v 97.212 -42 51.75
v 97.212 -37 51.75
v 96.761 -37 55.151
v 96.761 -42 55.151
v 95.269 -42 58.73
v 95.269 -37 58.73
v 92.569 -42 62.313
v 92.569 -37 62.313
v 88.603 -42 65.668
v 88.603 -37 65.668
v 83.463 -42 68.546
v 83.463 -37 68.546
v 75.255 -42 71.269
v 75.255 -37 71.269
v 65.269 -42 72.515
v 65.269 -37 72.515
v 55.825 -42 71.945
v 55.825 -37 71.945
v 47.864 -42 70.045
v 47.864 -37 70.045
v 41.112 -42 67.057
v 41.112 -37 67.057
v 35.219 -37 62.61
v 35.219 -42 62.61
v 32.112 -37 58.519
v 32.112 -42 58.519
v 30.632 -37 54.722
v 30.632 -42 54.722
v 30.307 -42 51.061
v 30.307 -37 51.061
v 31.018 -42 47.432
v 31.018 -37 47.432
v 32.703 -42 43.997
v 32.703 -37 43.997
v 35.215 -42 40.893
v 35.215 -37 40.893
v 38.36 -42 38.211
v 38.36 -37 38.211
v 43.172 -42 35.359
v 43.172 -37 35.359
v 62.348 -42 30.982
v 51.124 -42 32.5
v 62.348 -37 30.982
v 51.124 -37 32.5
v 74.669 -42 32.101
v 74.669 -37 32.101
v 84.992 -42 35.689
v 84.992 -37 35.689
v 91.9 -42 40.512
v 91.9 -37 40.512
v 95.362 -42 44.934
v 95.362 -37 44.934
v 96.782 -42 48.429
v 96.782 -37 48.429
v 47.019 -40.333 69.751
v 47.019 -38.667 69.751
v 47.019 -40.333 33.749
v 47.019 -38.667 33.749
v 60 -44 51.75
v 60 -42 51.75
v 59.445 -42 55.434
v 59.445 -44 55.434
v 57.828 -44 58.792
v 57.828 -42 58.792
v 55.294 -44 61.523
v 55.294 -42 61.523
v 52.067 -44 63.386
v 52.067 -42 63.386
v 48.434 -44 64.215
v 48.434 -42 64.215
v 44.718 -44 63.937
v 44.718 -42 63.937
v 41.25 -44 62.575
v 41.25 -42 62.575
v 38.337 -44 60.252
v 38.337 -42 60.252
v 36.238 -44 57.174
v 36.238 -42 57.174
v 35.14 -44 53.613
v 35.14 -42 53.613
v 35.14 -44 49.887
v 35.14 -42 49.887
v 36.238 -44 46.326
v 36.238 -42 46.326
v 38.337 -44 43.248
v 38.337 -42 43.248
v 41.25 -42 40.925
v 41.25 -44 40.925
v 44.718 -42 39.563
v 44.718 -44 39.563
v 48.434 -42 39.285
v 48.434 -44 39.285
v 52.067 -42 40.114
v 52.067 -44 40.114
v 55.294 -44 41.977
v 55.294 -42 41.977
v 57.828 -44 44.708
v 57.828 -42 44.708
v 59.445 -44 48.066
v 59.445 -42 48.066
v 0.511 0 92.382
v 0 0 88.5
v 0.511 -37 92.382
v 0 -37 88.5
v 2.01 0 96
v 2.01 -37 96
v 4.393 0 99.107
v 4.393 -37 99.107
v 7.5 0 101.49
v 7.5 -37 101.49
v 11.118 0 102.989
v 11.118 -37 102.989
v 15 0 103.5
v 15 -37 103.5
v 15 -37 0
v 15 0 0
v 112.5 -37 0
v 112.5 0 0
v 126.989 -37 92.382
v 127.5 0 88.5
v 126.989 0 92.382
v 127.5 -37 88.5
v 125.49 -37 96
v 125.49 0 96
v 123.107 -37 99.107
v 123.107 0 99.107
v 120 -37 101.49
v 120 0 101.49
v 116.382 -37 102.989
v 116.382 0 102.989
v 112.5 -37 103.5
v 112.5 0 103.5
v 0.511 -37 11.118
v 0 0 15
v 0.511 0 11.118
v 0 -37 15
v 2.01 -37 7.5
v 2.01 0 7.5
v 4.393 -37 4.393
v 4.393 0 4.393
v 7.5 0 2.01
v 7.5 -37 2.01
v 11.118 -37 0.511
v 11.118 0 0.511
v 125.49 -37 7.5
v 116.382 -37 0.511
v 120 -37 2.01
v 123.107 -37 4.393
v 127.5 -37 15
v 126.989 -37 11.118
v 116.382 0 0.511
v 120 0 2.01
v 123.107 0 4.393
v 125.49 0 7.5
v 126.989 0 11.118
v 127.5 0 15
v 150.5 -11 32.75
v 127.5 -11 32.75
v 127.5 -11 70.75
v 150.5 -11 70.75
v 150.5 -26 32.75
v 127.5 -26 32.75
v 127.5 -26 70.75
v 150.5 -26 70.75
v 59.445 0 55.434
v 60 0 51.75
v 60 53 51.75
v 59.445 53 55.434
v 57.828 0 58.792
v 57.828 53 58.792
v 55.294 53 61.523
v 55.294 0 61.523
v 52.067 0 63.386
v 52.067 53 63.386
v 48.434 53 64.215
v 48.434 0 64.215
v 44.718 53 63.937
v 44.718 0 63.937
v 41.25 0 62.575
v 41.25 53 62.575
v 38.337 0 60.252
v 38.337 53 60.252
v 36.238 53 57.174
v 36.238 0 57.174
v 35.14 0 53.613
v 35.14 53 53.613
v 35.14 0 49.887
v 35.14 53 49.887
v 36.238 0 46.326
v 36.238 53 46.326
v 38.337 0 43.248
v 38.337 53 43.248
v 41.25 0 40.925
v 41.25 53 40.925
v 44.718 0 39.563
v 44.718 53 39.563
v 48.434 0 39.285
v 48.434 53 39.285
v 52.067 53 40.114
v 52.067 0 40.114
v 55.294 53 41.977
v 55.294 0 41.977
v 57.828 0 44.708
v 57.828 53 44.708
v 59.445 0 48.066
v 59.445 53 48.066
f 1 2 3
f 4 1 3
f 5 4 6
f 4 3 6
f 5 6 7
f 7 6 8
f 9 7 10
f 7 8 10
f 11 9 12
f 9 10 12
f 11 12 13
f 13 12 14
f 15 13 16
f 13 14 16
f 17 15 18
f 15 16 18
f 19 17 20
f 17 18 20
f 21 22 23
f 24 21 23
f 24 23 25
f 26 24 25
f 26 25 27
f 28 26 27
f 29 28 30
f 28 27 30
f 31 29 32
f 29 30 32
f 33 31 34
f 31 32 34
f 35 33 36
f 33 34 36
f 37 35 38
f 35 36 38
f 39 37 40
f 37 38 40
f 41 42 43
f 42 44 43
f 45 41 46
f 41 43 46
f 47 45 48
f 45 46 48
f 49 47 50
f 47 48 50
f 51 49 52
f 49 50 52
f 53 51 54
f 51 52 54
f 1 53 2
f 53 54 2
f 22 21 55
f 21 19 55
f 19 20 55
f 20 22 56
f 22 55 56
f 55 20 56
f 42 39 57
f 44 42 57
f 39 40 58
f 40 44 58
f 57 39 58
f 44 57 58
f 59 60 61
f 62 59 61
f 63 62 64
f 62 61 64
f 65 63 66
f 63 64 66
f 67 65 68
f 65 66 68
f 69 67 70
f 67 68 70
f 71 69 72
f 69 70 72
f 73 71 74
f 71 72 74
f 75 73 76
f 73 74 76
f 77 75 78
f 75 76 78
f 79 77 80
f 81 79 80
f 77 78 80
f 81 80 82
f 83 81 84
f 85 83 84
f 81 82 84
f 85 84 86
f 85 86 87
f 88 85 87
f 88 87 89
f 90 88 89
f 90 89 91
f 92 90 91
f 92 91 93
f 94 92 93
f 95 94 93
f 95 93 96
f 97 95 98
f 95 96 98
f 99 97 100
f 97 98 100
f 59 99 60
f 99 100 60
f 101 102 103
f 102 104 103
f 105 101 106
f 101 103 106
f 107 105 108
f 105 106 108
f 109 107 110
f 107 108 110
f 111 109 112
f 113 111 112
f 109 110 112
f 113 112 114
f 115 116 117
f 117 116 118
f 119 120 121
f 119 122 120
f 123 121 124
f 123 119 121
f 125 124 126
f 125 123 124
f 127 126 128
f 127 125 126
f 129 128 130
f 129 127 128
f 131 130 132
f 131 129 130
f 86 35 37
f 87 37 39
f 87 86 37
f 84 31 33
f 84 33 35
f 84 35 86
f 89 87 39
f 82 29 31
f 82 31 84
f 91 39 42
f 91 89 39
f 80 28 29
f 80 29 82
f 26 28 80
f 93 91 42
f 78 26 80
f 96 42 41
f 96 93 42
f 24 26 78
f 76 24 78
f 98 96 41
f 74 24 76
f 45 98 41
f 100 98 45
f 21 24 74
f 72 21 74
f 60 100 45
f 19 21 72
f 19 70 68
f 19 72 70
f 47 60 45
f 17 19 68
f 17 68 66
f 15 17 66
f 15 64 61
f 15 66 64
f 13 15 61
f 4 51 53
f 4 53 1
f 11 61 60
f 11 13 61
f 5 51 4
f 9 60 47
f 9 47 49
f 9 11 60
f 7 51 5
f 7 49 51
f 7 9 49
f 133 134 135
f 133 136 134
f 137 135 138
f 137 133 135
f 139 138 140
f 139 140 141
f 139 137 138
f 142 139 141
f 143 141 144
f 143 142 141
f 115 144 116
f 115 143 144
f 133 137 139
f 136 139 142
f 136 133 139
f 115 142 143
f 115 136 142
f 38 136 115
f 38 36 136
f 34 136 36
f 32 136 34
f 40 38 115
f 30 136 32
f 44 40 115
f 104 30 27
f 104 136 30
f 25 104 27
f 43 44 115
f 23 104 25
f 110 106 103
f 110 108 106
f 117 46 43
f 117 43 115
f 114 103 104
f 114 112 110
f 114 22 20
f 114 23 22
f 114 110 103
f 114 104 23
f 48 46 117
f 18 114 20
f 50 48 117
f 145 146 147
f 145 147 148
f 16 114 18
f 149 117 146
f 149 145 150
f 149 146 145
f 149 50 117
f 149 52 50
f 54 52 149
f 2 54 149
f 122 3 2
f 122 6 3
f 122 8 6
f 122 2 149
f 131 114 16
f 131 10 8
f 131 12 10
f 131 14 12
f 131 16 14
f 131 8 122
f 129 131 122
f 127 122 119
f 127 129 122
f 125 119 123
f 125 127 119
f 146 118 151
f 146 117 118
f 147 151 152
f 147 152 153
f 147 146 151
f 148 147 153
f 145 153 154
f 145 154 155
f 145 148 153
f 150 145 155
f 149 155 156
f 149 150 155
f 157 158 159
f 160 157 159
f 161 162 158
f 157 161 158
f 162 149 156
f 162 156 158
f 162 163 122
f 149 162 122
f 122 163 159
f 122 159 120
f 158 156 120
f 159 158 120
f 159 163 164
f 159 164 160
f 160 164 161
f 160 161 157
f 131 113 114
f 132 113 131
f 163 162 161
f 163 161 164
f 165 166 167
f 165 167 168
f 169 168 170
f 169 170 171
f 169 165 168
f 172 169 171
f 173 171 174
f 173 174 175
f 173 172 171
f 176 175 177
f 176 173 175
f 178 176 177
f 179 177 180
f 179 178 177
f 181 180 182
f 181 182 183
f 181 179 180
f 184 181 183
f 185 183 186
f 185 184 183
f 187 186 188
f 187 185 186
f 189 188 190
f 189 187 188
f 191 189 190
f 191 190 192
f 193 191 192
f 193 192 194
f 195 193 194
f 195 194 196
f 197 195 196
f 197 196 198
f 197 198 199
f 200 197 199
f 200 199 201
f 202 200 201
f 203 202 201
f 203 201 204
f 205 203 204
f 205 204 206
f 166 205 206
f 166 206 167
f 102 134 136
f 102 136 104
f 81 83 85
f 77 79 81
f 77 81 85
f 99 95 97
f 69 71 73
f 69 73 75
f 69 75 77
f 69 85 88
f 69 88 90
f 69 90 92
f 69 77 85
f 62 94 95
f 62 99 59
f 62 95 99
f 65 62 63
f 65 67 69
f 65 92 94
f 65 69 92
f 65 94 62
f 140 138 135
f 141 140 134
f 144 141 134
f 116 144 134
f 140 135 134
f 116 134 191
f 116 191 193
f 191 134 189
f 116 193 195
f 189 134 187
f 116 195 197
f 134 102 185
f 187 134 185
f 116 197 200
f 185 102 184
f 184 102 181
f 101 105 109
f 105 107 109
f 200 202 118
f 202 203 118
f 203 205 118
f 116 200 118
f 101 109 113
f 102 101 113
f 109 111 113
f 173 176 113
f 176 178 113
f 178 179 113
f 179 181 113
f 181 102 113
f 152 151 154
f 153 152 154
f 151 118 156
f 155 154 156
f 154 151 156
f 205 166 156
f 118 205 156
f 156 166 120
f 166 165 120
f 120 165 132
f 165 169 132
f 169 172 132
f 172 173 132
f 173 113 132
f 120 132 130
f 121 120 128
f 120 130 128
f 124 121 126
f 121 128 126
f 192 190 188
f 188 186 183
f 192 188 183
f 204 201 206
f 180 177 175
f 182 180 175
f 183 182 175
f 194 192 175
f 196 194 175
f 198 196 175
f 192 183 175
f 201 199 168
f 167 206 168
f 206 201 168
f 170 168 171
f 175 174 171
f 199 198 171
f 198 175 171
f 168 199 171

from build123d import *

# Parameters (mm, degrees)
F0_W     = 127.5
F0_H     = 103.5
F1_DEPTH = 37
F2_R     = 15
F3_W     = 15
F3_H     = 38
F4_DEPTH = 23
F6_DEPTH = 5
F7_R     = 12.5
F8_DEPTH = 95
F9_DEPTH = 2


with BuildPart() as f1:
    # F0 (on Front) → F1 (new body)
    with BuildSketch(Plane.XZ):
        with Locations((63.75, 51.75)):
            Rectangle(F0_W, F0_H)
    extrude(amount=F1_DEPTH)

    # F2
    f2_edges = [f1.edges().sort_by_distance(p)[0] for p in [
        (127.5, -18.5, 103.5),
        (0, -18.5, 103.5),
        (127.5, -18.5, 0),
        (0, -18.5, 0),
    ]]
    fillet(f2_edges, radius=F2_R)

    # F3 (on face) → F4 (join)
    with BuildSketch(Plane.YZ.offset(127.5)):
        with Locations((-18.5, 51.75)):
            Rectangle(F3_W, F3_H)
    extrude(amount=F4_DEPTH)

    # F5 (on face) → F6 (join)
    with BuildSketch(Plane.XZ.offset(37)):
        with BuildLine():
            add(Edge.make_bspline(
                [(97.211815, 51.75), (97.211815, 87.752968), (47.019092, 69.751484), (-3.173631, 51.75), (47.019092, 33.748516), (97.211815, 15.747032), (97.211815, 51.75)],
                knots=[0, 0, 0, 2.094395, 2.094395, 4.18879, 4.18879, 6.283185, 6.283185, 6.283185], degree=2, weights=[1, 0.5, 1, 0.5, 1, 0.5, 1]))
        make_face()
    extrude(amount=F6_DEPTH)

    # F7 (on face) → F8 (join)
    with BuildSketch(Plane.XZ.offset(42)):
        with Locations((47.5, 51.75)):
            Circle(F7_R)
    extrude(amount=-F8_DEPTH)

    # F7 (on face) → F9 (join)
    with BuildSketch(Plane.XZ.offset(42)):
        with Locations((47.5, 51.75)):
            Circle(F7_R)
    extrude(amount=F9_DEPTH)


solid = f1.part
